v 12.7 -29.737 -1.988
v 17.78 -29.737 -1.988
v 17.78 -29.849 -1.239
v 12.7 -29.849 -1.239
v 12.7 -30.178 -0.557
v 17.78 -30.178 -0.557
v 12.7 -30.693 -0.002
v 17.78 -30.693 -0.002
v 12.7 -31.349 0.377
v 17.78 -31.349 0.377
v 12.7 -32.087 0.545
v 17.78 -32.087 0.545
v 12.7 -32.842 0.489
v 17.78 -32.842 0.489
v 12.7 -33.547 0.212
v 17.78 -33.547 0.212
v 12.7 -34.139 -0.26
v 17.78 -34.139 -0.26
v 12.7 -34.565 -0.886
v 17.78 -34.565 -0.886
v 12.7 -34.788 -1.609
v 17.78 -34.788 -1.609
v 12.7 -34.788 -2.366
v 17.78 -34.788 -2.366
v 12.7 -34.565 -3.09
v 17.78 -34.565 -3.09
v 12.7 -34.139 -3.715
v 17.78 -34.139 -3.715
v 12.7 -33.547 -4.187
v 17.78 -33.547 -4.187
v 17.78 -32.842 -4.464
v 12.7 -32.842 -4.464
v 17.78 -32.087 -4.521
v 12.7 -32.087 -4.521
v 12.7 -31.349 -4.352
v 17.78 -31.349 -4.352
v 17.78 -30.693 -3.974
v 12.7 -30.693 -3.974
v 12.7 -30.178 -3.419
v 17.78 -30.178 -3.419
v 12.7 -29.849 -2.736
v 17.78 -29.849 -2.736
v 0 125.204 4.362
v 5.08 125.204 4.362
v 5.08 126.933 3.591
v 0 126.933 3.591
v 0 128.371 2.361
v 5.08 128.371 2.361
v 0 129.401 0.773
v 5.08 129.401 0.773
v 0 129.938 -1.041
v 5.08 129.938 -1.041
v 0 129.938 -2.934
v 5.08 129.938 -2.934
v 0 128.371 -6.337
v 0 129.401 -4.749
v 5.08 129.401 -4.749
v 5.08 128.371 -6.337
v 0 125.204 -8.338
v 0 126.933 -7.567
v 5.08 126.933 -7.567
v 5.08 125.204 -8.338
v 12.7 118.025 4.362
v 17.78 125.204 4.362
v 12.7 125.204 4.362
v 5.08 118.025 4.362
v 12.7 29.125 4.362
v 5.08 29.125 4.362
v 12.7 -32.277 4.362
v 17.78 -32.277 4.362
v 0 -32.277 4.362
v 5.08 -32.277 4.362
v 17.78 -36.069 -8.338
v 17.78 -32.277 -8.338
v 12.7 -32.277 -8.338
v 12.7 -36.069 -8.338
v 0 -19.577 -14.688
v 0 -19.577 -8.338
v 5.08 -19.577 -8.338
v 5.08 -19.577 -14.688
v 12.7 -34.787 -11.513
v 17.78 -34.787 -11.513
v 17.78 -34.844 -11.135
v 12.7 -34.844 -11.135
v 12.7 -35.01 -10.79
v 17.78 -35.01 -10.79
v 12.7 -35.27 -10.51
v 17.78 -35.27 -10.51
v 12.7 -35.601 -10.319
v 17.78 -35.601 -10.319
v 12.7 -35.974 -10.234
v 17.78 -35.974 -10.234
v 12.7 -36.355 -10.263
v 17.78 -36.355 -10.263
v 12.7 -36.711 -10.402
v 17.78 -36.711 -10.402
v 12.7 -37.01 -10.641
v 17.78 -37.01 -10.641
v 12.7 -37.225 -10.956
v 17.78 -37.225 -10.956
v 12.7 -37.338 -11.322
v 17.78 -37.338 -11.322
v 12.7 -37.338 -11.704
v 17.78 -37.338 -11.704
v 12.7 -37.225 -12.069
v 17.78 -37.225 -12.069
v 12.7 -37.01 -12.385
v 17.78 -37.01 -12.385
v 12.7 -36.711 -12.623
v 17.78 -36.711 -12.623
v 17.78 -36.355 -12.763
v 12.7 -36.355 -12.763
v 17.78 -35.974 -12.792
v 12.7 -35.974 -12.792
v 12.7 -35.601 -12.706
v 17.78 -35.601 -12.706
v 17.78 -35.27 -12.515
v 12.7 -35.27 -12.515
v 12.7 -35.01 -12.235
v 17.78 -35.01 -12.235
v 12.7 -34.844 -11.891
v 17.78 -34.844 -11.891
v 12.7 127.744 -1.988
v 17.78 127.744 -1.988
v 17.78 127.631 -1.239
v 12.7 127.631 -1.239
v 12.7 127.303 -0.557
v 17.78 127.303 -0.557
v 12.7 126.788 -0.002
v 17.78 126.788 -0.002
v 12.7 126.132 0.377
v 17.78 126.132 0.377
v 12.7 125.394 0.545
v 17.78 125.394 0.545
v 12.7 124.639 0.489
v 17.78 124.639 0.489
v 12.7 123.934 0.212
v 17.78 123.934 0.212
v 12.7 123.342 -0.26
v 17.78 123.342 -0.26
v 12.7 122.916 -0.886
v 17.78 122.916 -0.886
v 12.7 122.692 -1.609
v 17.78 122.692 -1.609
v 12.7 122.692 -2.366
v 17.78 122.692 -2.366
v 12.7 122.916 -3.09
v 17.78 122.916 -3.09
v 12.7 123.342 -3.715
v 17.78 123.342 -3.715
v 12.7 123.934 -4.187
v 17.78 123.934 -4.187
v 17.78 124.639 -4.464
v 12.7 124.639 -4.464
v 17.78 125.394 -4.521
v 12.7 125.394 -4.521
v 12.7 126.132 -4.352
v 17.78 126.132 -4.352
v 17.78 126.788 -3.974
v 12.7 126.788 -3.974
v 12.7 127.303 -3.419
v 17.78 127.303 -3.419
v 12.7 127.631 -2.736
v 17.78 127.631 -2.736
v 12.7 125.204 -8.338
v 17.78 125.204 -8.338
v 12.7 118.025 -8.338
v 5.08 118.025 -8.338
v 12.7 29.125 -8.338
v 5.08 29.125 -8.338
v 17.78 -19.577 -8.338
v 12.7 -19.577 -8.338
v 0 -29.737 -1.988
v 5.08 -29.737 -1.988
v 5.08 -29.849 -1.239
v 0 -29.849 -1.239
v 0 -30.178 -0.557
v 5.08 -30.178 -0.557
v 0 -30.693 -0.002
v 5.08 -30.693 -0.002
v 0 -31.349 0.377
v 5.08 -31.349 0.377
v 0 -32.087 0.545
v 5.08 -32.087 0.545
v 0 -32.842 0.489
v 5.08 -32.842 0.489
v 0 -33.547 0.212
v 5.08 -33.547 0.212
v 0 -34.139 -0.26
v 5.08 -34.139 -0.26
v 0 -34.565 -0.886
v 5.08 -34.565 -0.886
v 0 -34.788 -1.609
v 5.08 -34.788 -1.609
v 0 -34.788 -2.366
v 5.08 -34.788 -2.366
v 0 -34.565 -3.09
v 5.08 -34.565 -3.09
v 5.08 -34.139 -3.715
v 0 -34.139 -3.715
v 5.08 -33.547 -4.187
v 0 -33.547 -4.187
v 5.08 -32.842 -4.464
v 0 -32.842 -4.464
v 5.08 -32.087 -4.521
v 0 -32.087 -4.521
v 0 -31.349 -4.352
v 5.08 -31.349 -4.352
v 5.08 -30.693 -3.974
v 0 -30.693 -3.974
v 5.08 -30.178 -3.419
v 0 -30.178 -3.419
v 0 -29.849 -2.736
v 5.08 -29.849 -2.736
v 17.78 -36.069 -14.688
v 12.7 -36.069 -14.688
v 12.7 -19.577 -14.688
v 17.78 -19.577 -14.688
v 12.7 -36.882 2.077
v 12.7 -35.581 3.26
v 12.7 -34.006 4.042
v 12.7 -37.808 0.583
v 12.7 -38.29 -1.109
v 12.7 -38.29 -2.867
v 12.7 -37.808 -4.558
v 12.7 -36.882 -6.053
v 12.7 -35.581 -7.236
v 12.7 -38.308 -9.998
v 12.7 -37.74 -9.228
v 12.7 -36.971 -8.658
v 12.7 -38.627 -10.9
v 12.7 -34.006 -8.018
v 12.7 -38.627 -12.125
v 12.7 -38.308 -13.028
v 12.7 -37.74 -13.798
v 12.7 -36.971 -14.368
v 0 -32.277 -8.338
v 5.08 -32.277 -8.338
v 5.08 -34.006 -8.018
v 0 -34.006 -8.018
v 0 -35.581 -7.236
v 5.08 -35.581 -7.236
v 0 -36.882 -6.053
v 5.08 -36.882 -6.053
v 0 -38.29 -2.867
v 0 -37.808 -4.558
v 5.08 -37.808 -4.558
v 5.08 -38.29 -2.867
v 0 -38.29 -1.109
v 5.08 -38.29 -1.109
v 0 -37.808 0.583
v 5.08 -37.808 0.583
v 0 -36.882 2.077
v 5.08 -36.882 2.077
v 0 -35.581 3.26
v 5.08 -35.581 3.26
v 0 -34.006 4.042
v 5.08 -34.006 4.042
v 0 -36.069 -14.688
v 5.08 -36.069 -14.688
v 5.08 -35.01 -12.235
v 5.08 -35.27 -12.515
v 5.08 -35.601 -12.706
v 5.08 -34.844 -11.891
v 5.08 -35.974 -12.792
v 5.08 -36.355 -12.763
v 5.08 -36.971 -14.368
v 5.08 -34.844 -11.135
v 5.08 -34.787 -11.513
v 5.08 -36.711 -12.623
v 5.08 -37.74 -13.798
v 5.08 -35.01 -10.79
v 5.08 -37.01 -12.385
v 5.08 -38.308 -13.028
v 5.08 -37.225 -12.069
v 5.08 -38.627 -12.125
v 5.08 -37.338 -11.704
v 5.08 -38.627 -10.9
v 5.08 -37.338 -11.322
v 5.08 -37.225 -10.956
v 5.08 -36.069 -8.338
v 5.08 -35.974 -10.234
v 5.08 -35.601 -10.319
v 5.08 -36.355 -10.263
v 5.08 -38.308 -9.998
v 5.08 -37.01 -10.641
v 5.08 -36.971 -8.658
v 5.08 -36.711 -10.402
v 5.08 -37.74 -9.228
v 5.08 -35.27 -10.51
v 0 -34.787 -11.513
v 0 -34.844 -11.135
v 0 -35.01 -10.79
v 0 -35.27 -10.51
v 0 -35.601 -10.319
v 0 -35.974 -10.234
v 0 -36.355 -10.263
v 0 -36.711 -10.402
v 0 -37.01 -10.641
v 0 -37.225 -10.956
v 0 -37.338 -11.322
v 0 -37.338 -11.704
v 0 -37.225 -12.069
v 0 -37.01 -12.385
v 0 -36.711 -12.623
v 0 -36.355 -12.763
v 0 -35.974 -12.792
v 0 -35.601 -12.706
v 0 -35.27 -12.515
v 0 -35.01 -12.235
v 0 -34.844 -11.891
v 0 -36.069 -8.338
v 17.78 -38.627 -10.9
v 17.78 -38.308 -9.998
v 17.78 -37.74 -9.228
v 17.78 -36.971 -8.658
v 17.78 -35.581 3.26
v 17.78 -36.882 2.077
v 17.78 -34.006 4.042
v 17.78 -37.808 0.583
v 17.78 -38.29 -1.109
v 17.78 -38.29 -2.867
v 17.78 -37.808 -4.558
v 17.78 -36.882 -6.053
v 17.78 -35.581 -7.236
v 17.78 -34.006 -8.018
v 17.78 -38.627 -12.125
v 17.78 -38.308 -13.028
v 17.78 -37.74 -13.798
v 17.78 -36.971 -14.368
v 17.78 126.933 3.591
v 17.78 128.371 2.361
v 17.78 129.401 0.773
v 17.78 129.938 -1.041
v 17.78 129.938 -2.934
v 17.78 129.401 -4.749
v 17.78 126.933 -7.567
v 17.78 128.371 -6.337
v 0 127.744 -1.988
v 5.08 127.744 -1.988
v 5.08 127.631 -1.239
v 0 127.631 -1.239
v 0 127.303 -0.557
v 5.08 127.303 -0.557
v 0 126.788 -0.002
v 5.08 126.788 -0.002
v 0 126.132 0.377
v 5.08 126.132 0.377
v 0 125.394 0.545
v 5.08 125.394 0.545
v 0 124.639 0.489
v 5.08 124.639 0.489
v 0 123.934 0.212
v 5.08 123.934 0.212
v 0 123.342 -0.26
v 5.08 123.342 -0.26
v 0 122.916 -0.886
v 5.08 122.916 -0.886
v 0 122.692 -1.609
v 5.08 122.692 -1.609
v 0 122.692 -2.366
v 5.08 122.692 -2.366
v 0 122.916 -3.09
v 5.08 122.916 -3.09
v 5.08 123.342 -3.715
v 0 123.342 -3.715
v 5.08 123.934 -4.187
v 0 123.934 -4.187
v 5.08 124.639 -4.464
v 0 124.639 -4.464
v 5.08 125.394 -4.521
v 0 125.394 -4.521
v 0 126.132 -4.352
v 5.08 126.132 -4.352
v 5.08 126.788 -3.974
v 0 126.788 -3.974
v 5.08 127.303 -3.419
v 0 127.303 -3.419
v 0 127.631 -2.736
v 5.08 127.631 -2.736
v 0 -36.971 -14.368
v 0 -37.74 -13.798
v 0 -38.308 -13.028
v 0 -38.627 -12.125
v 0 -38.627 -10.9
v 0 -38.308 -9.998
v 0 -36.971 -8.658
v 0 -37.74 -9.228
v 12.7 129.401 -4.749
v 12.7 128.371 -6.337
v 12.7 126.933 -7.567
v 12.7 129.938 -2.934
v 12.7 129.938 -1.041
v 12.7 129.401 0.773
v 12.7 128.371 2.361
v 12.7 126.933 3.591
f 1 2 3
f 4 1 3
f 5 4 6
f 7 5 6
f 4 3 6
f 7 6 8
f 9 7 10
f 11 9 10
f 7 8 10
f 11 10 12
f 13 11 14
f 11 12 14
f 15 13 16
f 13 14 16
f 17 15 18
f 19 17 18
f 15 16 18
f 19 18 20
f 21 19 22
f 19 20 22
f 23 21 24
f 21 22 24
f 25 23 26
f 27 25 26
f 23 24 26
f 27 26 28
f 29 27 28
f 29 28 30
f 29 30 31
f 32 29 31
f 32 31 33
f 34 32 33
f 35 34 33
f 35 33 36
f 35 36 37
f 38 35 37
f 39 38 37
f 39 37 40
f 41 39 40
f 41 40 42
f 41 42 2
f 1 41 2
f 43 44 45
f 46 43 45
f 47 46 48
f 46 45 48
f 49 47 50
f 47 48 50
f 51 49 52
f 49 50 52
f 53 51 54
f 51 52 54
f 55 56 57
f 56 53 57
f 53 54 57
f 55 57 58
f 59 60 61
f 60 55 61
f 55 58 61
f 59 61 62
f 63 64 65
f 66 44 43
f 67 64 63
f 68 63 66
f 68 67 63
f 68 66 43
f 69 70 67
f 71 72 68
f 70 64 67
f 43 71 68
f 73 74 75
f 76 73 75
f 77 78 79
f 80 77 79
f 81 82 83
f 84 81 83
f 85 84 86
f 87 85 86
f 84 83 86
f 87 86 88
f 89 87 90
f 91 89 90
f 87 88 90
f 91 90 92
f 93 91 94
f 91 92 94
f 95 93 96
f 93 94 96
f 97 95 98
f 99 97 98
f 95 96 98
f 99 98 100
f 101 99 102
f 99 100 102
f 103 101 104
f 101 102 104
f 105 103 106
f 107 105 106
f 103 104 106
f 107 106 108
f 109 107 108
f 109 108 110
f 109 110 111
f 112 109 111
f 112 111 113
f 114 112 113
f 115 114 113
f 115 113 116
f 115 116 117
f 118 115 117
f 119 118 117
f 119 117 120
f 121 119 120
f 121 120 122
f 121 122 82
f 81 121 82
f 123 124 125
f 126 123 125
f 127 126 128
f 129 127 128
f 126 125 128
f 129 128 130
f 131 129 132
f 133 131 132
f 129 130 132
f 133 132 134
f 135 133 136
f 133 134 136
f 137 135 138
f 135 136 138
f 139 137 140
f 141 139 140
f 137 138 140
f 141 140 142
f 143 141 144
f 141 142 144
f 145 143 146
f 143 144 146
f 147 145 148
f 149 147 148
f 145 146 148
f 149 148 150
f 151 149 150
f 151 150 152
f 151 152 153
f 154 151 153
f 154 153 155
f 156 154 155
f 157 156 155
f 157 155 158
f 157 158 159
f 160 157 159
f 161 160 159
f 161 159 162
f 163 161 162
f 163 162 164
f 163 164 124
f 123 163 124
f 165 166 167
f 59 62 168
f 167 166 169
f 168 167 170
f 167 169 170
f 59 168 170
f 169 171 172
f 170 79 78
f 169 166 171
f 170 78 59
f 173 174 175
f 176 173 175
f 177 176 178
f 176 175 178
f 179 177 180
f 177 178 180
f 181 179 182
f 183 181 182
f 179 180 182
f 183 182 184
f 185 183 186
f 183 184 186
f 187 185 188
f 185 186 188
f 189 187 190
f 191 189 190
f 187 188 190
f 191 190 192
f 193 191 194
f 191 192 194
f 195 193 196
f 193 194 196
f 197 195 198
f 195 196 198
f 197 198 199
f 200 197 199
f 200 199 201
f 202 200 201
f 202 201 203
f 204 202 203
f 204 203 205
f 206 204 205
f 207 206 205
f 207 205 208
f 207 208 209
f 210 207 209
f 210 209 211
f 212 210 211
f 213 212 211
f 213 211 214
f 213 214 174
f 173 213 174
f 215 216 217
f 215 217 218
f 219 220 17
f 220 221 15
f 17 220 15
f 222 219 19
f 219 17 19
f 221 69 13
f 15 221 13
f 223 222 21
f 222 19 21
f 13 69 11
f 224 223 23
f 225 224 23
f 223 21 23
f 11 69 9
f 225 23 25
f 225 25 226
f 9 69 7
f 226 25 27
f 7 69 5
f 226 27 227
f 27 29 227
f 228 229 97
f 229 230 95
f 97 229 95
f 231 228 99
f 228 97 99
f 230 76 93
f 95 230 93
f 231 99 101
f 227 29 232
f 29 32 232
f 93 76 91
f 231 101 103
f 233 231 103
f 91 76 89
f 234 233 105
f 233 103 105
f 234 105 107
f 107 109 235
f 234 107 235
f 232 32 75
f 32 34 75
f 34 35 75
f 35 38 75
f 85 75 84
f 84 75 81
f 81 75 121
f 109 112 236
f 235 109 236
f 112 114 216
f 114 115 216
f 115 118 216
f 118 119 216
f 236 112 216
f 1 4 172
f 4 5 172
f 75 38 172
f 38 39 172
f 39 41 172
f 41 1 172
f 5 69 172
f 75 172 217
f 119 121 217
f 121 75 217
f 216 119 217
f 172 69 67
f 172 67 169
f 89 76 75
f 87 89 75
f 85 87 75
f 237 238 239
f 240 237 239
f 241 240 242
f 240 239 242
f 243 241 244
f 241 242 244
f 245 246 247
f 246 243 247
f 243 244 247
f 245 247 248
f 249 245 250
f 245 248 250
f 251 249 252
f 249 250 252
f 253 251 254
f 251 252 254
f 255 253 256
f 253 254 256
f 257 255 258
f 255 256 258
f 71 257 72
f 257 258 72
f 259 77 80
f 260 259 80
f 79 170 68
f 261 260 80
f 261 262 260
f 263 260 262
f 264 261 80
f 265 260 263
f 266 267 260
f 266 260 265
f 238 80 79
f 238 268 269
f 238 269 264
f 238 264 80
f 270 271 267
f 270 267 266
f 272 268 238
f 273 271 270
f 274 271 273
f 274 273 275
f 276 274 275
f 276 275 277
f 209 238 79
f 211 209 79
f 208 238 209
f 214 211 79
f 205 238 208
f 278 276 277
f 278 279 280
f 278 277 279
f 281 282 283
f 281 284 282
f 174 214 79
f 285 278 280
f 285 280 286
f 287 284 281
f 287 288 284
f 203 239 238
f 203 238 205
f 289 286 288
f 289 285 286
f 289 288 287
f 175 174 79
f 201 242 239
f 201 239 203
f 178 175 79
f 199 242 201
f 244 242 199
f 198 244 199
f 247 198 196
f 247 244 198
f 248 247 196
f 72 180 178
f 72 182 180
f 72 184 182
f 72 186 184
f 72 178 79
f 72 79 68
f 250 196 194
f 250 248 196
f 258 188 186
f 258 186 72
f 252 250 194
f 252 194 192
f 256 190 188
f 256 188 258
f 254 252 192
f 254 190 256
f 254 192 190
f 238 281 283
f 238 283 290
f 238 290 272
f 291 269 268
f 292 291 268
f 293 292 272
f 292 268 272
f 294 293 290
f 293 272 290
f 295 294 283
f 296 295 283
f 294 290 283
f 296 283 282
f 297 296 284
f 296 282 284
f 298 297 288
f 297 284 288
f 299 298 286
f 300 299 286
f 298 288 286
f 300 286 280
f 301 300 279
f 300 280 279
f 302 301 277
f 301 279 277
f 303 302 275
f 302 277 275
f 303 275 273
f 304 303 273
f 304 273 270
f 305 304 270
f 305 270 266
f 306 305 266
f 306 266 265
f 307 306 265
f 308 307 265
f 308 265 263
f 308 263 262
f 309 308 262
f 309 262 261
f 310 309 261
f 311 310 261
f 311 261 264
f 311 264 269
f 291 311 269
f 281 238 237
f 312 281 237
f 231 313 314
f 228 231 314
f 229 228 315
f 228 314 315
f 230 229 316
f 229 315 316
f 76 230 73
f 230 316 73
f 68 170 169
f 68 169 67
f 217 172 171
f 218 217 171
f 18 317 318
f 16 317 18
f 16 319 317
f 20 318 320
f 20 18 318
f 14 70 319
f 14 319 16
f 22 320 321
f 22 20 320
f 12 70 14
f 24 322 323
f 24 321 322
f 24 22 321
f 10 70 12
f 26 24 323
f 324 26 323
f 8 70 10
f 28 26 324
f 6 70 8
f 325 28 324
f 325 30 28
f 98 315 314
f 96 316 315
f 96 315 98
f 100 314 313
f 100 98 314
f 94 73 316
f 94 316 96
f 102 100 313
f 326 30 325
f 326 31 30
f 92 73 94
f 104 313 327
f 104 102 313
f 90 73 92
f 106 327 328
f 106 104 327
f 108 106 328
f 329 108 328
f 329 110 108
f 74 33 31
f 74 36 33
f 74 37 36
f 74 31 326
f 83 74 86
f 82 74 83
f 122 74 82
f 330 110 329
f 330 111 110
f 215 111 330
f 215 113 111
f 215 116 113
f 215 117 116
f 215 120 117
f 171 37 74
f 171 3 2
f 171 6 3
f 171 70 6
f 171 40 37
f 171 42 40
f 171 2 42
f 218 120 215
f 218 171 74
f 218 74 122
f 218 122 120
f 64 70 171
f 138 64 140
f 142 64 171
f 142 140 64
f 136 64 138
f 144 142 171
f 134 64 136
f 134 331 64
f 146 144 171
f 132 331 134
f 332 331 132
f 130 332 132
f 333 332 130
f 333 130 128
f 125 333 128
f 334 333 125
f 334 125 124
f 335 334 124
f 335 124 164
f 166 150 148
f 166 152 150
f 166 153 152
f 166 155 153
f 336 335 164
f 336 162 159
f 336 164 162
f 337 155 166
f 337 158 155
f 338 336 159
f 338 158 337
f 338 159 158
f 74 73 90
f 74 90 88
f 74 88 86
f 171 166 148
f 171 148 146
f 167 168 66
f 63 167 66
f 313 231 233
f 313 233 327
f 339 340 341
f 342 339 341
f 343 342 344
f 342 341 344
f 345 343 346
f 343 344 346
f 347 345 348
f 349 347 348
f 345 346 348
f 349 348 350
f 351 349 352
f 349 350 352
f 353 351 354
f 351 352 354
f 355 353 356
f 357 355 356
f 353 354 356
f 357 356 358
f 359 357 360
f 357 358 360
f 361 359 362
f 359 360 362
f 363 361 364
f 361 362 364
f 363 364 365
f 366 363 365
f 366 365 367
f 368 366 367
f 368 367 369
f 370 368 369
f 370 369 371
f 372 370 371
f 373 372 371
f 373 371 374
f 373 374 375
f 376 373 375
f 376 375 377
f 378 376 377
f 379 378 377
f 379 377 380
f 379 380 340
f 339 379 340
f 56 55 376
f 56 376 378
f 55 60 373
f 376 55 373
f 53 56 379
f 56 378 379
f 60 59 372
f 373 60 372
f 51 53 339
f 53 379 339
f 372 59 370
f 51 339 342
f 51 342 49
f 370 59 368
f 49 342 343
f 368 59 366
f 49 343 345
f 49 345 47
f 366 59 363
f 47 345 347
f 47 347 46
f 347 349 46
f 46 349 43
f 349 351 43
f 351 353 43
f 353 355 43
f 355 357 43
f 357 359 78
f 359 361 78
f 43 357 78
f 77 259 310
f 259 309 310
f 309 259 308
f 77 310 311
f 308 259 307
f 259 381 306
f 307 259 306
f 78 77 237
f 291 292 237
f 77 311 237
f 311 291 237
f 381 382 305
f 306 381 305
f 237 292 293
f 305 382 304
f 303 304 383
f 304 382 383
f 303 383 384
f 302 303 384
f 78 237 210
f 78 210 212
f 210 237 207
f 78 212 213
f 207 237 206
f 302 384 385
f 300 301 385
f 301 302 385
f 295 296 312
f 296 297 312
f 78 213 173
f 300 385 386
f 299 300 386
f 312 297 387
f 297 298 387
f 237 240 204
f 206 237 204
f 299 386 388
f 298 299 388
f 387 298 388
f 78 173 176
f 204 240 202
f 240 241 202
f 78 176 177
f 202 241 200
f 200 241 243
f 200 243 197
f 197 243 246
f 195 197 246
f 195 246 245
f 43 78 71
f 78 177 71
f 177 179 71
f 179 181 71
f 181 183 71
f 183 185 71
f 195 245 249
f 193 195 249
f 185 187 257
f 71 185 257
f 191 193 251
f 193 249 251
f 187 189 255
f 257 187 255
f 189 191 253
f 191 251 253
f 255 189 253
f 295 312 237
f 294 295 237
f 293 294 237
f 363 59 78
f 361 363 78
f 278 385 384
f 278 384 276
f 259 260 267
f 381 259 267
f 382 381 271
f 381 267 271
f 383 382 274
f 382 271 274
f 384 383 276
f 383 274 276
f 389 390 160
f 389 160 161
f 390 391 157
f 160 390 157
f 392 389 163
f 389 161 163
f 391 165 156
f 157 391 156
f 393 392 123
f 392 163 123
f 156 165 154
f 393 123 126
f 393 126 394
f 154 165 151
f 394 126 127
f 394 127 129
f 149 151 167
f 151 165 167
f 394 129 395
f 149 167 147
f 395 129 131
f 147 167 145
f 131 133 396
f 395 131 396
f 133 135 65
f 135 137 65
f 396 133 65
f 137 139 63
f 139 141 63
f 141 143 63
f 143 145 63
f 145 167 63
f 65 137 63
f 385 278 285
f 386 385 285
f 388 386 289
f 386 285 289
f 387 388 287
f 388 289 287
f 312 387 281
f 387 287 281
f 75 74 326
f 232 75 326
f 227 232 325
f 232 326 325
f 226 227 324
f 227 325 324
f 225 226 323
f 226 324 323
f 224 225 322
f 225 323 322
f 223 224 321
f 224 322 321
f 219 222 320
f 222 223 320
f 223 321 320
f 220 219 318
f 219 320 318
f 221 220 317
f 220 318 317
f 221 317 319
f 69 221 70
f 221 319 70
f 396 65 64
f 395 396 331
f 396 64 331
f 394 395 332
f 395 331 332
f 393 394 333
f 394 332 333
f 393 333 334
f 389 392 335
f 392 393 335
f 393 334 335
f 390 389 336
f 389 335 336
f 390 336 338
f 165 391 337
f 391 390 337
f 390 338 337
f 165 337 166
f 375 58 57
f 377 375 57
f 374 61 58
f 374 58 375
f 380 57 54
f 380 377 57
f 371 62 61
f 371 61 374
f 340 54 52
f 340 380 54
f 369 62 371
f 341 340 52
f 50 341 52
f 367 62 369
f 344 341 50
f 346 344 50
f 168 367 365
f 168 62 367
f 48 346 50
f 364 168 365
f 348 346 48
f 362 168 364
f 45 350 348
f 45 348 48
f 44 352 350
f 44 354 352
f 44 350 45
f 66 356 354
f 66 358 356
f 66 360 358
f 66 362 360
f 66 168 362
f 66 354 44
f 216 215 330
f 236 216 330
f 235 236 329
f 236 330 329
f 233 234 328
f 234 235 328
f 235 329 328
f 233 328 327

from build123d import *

# Parameters (mm, degrees)
F0_W      = 63.5
F0_H      = 12.7
F1_DEPTH  = 17.78
F2_W      = 5.08
F2_H      = 12.7
F3_DEPTH  = 25.4
F4_R      = 2.54
F5_DEPTH  = 25.4
F6_DEPTH  = 50.8
F7_DEPTH  = 76.2
F8_W      = 5.08
F8_H      = 12.7
F9_DEPTH  = 12.7
F11_W     = 5.08
F11_H     = 12.7
F12_DEPTH = 6.35
F13_DEPTH = 6.35
F15_DEPTH = 25.4
F10_R     = 2.54
F16_DEPTH = 25.4
F14_R     = 1.2823476499
F17_DEPTH = 25.4


# Not quite as in the source:
# - a feature names something its author has since deleted; it is built from what else it names


with BuildPart() as f1:
    # F0 (on Right) → F1 (new body)
    with BuildSketch(Plane.YZ):
        with Locations((10.0746992975, -1.9877629941)):
            Rectangle(F0_W, F0_H)
    extrude(amount=F1_DEPTH)

    # F2 (on face) → F3 (join)
    with BuildSketch(Plane.XZ.offset(21.6753007025)):
        with Locations((2.54, -1.9877629941)):
            Rectangle(F2_W, F2_H)
        with Locations((15.24, -1.9877629941)):
            Rectangle(F2_W, F2_H)
    extrude(amount=F3_DEPTH)

    # F4 (on face) → F5 (cut)
    with BuildSketch(Plane.YZ.offset(17.78)):
        with Locations((-32.2765819728, -1.9877629941)):
            Circle(F4_R)
        with BuildLine():
            ThreePointArc((-32.2765819728, -8.3377629941), (-38.3512132445, -1.9877629941), (-32.2765819728, 4.3622370059))
            Line((-32.2765819728, 4.3622370059), (-47.0753007025, 4.3622370059))
            Line((-47.0753007025, 4.3622370059), (-47.0753007025, -8.3377629941))
            Line((-47.0753007025, -8.3377629941), (-32.2765819728, -8.3377629941))
        make_face()
    extrude(amount=-F5_DEPTH, mode=Mode.SUBTRACT)

    # F6 (cut): a face of the model
    f6_faces = [f1.faces().sort_by_distance(p)[0] for p in [
        (8.89, -21.6753007025, -1.9877629941),
    ]]
    extrude(f6_faces, amount=-F6_DEPTH, mode=Mode.SUBTRACT)

    # F7 (add): a face of the model
    f7_faces = [f1.faces().sort_by_distance(p)[0] for p in [
        (8.89, 41.8246992975, -1.9877629941),
    ]]
    extrude(f7_faces, amount=F7_DEPTH)

    # F8 (on face) → F9 (join)
    with BuildSketch(Plane(origin=(0, 118.0246992975, 0), x_dir=(-1, 0, 0), z_dir=(0, 1, 0))):
        with Locations((-15.24, -1.9877629941)):
            Rectangle(F8_W, F8_H)
        with Locations((-2.54, -1.9877629941)):
            Rectangle(F8_W, F8_H)
    extrude(amount=F9_DEPTH)

    # F11 (on face) → F12 (join)
    with BuildSketch(Plane(origin=(0, 0, -8.3377629941), x_dir=(1, 0, 0), z_dir=(0, 0, -1))):
        with Locations((15.24, 25.9265819728)):
            Rectangle(F11_W, F11_H)
        with Locations((2.54, 25.9265819728)):
            Rectangle(F11_W, F11_H)
    extrude(amount=F12_DEPTH)

    # F13 (add): faces of the model
    f13_faces = [f1.faces().sort_by_distance(p)[0] for p in [
        (15.24, -32.2765819728, -11.5127629941),
        (2.54, -32.2765819728, -11.5127629941),
    ]]
    extrude(f13_faces, amount=F13_DEPTH)

    # F14 (on face) → F15 (cut)
    with BuildSketch(Plane.YZ.offset(17.78)):
        with BuildLine():
            ThreePointArc((-38.6265819728, -10.9001689166), (-37.7400292742, -9.2277758835), (-36.0694751143, -8.3377629941))
            Line((-36.0694751143, -8.3377629941), (-38.6265819728, -8.3377629941))
            Line((-38.6265819728, -8.3377629941), (-38.6265819728, -10.9001689166))
        make_face()
        with BuildLine():
            ThreePointArc((-36.0694751143, -14.6877629941), (-37.7400292742, -13.7977501047), (-38.6265819728, -12.1253570717))
            Line((-38.6265819728, -12.1253570717), (-38.6265819728, -14.6877629941))
            Line((-38.6265819728, -14.6877629941), (-36.0694751143, -14.6877629941))
        make_face()
    extrude(amount=-F15_DEPTH, mode=Mode.SUBTRACT)

    # F10 (on face) → F16 (cut)
    with BuildSketch(Plane.YZ.offset(17.78)):
        with BuildLine():
            ThreePointArc((125.2040266991, 4.3622370059), (130.0066745518, -1.9877629941), (125.2040266991, -8.3377629941))
            Line((125.2040266991, -8.3377629941), (130.7246992975, -8.3377629941))
            Line((130.7246992975, -8.3377629941), (130.7246992975, 4.3622370059))
            Line((130.7246992975, 4.3622370059), (125.2040266991, 4.3622370059))
        make_face()
        with Locations((125.2040266991, -1.9877629941)):
            Circle(F10_R)
    extrude(amount=-F16_DEPTH, mode=Mode.SUBTRACT)

    # F14 (on face) → F17 (cut)
    with BuildSketch(Plane.YZ.offset(17.78)):
        with Locations((-36.0694751144, -11.5127629941)):
            Circle(F14_R)
    extrude(amount=-F17_DEPTH, mode=Mode.SUBTRACT)


solid = f1.part
